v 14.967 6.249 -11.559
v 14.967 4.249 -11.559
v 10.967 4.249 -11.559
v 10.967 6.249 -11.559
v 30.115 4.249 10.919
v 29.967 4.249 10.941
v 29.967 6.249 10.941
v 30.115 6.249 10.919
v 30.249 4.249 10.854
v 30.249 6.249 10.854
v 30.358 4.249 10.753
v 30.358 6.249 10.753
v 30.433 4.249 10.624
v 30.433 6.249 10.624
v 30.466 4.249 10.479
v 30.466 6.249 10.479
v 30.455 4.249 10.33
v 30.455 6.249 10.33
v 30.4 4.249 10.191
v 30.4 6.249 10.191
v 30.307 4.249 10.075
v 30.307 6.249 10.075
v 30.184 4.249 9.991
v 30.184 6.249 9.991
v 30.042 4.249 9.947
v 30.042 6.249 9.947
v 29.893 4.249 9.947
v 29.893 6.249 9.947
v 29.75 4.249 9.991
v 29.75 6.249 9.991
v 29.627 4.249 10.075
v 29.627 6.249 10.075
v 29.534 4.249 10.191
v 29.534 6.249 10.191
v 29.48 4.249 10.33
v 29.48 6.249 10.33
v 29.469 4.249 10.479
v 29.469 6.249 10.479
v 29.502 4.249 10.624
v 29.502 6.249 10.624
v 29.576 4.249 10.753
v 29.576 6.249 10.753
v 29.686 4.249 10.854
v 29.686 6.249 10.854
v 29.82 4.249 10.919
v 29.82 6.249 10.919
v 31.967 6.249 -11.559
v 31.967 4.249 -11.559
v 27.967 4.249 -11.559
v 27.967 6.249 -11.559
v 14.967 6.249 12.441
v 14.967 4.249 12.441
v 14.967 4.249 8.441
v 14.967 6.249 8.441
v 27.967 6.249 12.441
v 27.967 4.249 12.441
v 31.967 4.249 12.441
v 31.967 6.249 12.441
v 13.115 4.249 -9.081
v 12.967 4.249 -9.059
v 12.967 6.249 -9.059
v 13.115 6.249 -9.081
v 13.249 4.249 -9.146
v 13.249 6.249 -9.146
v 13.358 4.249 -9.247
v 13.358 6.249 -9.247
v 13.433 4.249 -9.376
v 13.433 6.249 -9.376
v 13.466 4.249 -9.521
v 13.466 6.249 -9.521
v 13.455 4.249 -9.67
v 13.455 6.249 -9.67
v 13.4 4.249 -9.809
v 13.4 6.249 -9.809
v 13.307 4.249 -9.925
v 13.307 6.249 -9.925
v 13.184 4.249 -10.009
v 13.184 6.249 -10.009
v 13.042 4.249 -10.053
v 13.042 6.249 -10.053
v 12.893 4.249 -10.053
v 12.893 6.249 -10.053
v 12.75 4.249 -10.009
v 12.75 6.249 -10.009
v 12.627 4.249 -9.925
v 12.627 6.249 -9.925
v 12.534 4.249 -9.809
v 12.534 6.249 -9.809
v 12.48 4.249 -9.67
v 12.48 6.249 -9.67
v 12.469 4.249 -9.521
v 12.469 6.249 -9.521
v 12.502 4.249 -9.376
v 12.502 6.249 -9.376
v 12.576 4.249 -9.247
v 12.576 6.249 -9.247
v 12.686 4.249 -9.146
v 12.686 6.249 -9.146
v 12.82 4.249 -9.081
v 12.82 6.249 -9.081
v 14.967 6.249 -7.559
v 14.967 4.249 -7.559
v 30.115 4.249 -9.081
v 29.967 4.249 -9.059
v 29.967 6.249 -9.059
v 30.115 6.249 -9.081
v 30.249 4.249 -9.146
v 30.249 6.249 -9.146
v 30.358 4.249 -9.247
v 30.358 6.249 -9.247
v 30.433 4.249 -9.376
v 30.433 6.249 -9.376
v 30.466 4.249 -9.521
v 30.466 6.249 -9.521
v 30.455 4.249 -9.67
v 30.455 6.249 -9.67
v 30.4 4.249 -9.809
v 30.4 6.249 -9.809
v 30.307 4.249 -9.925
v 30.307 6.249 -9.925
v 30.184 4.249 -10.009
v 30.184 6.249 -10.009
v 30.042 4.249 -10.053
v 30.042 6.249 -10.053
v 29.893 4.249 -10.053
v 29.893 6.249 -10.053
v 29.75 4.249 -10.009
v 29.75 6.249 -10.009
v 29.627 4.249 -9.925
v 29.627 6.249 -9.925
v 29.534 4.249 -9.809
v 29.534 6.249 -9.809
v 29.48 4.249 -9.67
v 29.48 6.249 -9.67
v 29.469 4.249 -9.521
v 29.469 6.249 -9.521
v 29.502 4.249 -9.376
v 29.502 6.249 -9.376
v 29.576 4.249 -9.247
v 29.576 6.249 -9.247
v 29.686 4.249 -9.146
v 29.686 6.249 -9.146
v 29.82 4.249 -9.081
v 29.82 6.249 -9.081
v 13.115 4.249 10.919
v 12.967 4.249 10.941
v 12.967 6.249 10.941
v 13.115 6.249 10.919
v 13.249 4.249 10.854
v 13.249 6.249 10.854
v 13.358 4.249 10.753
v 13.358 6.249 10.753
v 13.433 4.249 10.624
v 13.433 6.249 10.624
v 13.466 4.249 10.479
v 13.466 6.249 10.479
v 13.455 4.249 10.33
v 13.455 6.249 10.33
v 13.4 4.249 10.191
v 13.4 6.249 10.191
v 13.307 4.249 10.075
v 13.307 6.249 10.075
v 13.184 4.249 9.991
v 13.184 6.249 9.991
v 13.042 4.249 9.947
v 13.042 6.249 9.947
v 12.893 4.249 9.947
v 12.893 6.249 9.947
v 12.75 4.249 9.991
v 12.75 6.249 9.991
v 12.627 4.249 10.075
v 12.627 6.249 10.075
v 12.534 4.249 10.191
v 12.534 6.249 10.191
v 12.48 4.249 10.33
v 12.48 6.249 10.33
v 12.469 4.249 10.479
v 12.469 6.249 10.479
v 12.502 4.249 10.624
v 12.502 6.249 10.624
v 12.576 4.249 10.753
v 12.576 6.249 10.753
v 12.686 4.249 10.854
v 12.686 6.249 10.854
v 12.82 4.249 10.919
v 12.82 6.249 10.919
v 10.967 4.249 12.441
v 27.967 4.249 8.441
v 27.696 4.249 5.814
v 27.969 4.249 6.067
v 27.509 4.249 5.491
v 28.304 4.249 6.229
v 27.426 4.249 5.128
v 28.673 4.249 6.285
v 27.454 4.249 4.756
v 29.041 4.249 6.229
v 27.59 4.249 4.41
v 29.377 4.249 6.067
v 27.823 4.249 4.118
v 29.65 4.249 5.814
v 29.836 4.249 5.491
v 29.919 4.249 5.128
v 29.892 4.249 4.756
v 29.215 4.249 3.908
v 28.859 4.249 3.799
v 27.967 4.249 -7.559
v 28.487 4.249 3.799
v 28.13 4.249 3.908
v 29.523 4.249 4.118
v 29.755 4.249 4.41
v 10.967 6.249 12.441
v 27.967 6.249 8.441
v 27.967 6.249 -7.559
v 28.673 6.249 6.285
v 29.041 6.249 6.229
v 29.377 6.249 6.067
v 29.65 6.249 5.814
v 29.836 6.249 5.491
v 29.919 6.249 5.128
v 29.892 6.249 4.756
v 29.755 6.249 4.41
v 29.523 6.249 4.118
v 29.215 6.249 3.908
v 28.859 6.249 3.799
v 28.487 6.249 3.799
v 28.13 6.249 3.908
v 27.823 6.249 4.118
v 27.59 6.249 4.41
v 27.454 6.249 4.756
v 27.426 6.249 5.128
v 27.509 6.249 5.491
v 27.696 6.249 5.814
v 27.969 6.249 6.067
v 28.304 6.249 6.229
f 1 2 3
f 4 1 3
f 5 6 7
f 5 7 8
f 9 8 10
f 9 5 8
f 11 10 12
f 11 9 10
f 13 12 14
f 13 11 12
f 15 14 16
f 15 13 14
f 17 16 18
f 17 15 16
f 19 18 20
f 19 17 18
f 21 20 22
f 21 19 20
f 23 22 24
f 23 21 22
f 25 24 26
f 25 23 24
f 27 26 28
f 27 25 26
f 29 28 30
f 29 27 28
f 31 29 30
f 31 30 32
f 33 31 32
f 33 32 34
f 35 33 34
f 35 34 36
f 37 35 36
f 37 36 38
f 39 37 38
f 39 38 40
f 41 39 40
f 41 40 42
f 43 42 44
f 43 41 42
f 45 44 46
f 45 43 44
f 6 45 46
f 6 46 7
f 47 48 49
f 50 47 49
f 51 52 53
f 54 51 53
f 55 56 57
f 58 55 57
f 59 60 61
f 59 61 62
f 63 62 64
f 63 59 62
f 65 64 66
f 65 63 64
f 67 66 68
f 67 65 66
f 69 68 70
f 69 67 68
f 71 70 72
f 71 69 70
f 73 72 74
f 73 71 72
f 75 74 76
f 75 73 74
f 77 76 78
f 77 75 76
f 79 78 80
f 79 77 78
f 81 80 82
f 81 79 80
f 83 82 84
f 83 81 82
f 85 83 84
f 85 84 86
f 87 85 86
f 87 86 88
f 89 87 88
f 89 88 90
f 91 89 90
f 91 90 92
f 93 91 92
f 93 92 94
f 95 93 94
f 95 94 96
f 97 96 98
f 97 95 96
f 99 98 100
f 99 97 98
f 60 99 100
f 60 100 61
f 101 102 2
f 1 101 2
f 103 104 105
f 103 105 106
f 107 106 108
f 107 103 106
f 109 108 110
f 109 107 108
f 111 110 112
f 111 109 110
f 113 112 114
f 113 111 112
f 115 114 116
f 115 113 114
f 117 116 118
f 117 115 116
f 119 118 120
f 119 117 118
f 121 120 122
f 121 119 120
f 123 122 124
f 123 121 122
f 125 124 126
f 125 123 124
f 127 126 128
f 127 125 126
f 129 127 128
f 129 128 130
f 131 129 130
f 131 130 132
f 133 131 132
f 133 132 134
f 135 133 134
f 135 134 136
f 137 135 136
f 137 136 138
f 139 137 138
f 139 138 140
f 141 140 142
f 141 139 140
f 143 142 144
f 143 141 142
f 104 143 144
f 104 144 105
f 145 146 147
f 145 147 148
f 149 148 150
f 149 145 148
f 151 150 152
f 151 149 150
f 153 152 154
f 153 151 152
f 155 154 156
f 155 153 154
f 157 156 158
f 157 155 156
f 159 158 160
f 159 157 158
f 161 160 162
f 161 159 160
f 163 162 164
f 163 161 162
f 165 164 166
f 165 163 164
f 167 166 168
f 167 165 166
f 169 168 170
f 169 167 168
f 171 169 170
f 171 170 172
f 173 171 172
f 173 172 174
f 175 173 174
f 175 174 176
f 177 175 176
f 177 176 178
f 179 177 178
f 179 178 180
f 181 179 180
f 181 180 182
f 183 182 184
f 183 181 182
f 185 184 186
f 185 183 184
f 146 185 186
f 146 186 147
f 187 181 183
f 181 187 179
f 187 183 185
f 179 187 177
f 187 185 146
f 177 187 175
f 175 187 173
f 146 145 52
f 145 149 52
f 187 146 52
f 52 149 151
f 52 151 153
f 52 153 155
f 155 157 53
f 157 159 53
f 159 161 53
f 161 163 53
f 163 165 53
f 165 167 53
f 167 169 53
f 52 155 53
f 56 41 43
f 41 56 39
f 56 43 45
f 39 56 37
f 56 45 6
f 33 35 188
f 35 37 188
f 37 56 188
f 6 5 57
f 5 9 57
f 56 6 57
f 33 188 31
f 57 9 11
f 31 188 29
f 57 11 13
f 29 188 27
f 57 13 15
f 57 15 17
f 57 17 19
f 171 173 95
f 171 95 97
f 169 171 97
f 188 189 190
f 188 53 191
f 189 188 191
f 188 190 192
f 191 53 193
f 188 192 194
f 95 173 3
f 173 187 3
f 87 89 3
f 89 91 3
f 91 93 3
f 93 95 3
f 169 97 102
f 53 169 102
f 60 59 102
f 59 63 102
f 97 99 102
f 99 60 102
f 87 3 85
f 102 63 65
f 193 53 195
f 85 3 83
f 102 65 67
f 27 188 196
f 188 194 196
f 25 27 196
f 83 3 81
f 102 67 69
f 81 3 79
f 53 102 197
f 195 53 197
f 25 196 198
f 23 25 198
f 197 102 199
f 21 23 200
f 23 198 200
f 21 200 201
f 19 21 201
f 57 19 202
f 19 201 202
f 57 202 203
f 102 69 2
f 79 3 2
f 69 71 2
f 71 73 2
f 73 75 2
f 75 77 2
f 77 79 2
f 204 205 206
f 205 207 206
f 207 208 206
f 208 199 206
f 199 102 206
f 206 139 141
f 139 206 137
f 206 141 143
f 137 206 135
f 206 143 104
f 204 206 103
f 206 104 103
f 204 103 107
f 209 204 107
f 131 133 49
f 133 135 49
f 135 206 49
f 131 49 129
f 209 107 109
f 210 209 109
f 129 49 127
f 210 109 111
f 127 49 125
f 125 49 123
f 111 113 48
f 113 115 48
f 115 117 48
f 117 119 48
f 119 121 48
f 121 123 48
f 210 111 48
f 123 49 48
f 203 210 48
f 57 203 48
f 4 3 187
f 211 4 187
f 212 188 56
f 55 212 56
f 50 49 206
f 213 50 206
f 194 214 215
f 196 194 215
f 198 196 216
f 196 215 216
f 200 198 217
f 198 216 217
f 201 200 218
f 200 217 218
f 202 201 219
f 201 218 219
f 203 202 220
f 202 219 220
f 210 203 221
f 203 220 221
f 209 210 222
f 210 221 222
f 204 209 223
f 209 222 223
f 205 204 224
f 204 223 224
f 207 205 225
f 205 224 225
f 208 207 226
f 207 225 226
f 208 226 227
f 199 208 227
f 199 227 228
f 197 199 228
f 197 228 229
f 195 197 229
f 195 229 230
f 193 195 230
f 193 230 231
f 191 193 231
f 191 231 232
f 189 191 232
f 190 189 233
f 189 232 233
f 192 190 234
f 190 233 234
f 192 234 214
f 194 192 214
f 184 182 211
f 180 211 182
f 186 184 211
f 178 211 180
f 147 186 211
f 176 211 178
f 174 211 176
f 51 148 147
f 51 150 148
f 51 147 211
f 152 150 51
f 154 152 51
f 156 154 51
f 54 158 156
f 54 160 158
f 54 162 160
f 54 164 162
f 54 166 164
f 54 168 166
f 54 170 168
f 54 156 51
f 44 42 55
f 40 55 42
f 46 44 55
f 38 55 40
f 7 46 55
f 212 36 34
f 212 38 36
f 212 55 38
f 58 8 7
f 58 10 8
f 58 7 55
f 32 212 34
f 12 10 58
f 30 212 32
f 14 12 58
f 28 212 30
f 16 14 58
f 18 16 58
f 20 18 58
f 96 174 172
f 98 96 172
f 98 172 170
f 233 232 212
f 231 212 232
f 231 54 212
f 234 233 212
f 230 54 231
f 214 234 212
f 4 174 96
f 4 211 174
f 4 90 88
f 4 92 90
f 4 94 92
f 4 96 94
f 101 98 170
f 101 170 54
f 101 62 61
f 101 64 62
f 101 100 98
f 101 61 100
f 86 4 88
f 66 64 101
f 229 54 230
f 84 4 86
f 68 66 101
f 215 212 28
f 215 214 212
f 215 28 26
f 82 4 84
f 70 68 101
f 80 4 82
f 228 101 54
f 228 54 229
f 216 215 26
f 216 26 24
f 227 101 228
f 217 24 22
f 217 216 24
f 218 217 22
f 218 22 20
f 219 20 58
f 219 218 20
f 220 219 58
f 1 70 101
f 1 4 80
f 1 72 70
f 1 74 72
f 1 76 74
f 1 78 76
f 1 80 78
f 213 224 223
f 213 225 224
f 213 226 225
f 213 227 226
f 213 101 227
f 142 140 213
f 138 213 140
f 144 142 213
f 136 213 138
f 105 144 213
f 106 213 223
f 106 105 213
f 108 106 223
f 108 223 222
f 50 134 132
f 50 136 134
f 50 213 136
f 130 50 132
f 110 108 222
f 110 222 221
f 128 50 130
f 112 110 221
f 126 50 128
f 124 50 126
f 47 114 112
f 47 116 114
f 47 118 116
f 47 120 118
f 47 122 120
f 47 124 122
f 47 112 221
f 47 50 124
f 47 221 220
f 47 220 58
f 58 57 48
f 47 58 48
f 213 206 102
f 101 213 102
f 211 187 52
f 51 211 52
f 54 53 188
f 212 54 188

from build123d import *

# Parameters (mm, degrees)
SKETCH1_R           = 0.5
SKETCH1_W           = 2
SKETCH1_H           = 2
SKETCH1_H_2         = 6
BOSS_EXTRUDE1_DEPTH = 2
SKETCH2_R           = 1.25
CUT_EXTRUDE1_DEPTH  = 2


with BuildPart() as part:
    # Sketch1 → Boss-Extrude1 (new body)
    # profile 1 of 6: a face of its own
    with BuildSketch(Plane(origin=(0, 4.248778205, 0), x_dir=(1, 0, 0), z_dir=(0, 1, 0))):
        Polygon((12.967182815, 5.558634222), (31.967182815, 5.558634222), (31.967182815, 11.558634222), (27.967182815, 11.558634222), (27.967182815, 7.558634222), (14.967182815, 7.558634222), (14.967182815, 11.558634222), (10.967182815, 11.558634222), (10.967182815, 5.558634222), align=None)
        with Locations(Location((12.967182815, 9.558634222, 0), (0, 0, 270))):
            Circle(SKETCH1_R, mode=Mode.SUBTRACT)
        with Locations(Location((29.967182815, 9.558634222, 0), (0, 0, 270))):
            Circle(SKETCH1_R, mode=Mode.SUBTRACT)
    # profile 2 of 6: a face of its own
    with BuildSketch(Plane(origin=(0, 4.248778205, 0), x_dir=(1, 0, 0), z_dir=(0, 1, 0))):
        Polygon((31.967182815, -0.441365778), (31.967182815, 5.558634222), (12.967182815, 5.558634222), (12.967182815, 3.558634222), (10.967182815, 3.558634222), (10.967182815, -4.441365778), (12.967182815, -4.441365778), (12.967182815, -6.441365778), (29.967182815, -6.441365778), (29.967182815, -0.441365778), align=None)
    # profile 3 of 6: a face of its own
    with BuildSketch(Plane(origin=(0, 4.248778205, 0), x_dir=(1, 0, 0), z_dir=(0, 1, 0))):
        Polygon((31.967182815, -12.441365778), (31.967182815, -6.441365778), (29.967182815, -6.441365778), (12.967182815, -6.441365778), (10.967182815, -6.441365778), (10.967182815, -12.441365778), (14.967182815, -12.441365778), (14.967182815, -8.441365778), (27.967182815, -8.441365778), (27.967182815, -12.441365778), align=None)
        with Locations(Location((12.967182815, -10.441365778, 0), (0, 0, 270))):
            Circle(SKETCH1_R, mode=Mode.SUBTRACT)
        with Locations(Location((29.967182815, -10.441365778, 0), (0, 0, 270))):
            Circle(SKETCH1_R, mode=Mode.SUBTRACT)
    # profile 4 of 6: a face of its own
    with BuildSketch(Plane(origin=(0, 4.248778205, 0), x_dir=(1, 0, 0), z_dir=(0, 1, 0))):
        with Locations((11.967182815, -5.441365778)):
            Rectangle(SKETCH1_W, SKETCH1_H)
    # profile 5 of 6: a face of its own
    with BuildSketch(Plane(origin=(0, 4.248778205, 0), x_dir=(1, 0, 0), z_dir=(0, 1, 0))):
        with Locations((11.967182815, 4.558634222)):
            Rectangle(SKETCH1_W, SKETCH1_H)
    # profile 6 of 6: a face of its own
    with BuildSketch(Plane(origin=(0, 4.248778205, 0), x_dir=(1, 0, 0), z_dir=(0, 1, 0))):
        with Locations((30.967182815, -3.441365778)):
            Rectangle(SKETCH1_W, SKETCH1_H_2)
    extrude(amount=BOSS_EXTRUDE1_DEPTH)

    # Sketch2 → Cut-Extrude1 (cut)
    with BuildSketch(Plane(origin=(0, 6.248778205, 0), x_dir=(1, 0, 0), z_dir=(0, 1, 0))):
        with Locations(Location((28.672843406, -5.034622275, 0), (0, 0, 270))):
            Circle(SKETCH2_R)
    extrude(amount=-CUT_EXTRUDE1_DEPTH, mode=Mode.SUBTRACT)


solid = part.part
